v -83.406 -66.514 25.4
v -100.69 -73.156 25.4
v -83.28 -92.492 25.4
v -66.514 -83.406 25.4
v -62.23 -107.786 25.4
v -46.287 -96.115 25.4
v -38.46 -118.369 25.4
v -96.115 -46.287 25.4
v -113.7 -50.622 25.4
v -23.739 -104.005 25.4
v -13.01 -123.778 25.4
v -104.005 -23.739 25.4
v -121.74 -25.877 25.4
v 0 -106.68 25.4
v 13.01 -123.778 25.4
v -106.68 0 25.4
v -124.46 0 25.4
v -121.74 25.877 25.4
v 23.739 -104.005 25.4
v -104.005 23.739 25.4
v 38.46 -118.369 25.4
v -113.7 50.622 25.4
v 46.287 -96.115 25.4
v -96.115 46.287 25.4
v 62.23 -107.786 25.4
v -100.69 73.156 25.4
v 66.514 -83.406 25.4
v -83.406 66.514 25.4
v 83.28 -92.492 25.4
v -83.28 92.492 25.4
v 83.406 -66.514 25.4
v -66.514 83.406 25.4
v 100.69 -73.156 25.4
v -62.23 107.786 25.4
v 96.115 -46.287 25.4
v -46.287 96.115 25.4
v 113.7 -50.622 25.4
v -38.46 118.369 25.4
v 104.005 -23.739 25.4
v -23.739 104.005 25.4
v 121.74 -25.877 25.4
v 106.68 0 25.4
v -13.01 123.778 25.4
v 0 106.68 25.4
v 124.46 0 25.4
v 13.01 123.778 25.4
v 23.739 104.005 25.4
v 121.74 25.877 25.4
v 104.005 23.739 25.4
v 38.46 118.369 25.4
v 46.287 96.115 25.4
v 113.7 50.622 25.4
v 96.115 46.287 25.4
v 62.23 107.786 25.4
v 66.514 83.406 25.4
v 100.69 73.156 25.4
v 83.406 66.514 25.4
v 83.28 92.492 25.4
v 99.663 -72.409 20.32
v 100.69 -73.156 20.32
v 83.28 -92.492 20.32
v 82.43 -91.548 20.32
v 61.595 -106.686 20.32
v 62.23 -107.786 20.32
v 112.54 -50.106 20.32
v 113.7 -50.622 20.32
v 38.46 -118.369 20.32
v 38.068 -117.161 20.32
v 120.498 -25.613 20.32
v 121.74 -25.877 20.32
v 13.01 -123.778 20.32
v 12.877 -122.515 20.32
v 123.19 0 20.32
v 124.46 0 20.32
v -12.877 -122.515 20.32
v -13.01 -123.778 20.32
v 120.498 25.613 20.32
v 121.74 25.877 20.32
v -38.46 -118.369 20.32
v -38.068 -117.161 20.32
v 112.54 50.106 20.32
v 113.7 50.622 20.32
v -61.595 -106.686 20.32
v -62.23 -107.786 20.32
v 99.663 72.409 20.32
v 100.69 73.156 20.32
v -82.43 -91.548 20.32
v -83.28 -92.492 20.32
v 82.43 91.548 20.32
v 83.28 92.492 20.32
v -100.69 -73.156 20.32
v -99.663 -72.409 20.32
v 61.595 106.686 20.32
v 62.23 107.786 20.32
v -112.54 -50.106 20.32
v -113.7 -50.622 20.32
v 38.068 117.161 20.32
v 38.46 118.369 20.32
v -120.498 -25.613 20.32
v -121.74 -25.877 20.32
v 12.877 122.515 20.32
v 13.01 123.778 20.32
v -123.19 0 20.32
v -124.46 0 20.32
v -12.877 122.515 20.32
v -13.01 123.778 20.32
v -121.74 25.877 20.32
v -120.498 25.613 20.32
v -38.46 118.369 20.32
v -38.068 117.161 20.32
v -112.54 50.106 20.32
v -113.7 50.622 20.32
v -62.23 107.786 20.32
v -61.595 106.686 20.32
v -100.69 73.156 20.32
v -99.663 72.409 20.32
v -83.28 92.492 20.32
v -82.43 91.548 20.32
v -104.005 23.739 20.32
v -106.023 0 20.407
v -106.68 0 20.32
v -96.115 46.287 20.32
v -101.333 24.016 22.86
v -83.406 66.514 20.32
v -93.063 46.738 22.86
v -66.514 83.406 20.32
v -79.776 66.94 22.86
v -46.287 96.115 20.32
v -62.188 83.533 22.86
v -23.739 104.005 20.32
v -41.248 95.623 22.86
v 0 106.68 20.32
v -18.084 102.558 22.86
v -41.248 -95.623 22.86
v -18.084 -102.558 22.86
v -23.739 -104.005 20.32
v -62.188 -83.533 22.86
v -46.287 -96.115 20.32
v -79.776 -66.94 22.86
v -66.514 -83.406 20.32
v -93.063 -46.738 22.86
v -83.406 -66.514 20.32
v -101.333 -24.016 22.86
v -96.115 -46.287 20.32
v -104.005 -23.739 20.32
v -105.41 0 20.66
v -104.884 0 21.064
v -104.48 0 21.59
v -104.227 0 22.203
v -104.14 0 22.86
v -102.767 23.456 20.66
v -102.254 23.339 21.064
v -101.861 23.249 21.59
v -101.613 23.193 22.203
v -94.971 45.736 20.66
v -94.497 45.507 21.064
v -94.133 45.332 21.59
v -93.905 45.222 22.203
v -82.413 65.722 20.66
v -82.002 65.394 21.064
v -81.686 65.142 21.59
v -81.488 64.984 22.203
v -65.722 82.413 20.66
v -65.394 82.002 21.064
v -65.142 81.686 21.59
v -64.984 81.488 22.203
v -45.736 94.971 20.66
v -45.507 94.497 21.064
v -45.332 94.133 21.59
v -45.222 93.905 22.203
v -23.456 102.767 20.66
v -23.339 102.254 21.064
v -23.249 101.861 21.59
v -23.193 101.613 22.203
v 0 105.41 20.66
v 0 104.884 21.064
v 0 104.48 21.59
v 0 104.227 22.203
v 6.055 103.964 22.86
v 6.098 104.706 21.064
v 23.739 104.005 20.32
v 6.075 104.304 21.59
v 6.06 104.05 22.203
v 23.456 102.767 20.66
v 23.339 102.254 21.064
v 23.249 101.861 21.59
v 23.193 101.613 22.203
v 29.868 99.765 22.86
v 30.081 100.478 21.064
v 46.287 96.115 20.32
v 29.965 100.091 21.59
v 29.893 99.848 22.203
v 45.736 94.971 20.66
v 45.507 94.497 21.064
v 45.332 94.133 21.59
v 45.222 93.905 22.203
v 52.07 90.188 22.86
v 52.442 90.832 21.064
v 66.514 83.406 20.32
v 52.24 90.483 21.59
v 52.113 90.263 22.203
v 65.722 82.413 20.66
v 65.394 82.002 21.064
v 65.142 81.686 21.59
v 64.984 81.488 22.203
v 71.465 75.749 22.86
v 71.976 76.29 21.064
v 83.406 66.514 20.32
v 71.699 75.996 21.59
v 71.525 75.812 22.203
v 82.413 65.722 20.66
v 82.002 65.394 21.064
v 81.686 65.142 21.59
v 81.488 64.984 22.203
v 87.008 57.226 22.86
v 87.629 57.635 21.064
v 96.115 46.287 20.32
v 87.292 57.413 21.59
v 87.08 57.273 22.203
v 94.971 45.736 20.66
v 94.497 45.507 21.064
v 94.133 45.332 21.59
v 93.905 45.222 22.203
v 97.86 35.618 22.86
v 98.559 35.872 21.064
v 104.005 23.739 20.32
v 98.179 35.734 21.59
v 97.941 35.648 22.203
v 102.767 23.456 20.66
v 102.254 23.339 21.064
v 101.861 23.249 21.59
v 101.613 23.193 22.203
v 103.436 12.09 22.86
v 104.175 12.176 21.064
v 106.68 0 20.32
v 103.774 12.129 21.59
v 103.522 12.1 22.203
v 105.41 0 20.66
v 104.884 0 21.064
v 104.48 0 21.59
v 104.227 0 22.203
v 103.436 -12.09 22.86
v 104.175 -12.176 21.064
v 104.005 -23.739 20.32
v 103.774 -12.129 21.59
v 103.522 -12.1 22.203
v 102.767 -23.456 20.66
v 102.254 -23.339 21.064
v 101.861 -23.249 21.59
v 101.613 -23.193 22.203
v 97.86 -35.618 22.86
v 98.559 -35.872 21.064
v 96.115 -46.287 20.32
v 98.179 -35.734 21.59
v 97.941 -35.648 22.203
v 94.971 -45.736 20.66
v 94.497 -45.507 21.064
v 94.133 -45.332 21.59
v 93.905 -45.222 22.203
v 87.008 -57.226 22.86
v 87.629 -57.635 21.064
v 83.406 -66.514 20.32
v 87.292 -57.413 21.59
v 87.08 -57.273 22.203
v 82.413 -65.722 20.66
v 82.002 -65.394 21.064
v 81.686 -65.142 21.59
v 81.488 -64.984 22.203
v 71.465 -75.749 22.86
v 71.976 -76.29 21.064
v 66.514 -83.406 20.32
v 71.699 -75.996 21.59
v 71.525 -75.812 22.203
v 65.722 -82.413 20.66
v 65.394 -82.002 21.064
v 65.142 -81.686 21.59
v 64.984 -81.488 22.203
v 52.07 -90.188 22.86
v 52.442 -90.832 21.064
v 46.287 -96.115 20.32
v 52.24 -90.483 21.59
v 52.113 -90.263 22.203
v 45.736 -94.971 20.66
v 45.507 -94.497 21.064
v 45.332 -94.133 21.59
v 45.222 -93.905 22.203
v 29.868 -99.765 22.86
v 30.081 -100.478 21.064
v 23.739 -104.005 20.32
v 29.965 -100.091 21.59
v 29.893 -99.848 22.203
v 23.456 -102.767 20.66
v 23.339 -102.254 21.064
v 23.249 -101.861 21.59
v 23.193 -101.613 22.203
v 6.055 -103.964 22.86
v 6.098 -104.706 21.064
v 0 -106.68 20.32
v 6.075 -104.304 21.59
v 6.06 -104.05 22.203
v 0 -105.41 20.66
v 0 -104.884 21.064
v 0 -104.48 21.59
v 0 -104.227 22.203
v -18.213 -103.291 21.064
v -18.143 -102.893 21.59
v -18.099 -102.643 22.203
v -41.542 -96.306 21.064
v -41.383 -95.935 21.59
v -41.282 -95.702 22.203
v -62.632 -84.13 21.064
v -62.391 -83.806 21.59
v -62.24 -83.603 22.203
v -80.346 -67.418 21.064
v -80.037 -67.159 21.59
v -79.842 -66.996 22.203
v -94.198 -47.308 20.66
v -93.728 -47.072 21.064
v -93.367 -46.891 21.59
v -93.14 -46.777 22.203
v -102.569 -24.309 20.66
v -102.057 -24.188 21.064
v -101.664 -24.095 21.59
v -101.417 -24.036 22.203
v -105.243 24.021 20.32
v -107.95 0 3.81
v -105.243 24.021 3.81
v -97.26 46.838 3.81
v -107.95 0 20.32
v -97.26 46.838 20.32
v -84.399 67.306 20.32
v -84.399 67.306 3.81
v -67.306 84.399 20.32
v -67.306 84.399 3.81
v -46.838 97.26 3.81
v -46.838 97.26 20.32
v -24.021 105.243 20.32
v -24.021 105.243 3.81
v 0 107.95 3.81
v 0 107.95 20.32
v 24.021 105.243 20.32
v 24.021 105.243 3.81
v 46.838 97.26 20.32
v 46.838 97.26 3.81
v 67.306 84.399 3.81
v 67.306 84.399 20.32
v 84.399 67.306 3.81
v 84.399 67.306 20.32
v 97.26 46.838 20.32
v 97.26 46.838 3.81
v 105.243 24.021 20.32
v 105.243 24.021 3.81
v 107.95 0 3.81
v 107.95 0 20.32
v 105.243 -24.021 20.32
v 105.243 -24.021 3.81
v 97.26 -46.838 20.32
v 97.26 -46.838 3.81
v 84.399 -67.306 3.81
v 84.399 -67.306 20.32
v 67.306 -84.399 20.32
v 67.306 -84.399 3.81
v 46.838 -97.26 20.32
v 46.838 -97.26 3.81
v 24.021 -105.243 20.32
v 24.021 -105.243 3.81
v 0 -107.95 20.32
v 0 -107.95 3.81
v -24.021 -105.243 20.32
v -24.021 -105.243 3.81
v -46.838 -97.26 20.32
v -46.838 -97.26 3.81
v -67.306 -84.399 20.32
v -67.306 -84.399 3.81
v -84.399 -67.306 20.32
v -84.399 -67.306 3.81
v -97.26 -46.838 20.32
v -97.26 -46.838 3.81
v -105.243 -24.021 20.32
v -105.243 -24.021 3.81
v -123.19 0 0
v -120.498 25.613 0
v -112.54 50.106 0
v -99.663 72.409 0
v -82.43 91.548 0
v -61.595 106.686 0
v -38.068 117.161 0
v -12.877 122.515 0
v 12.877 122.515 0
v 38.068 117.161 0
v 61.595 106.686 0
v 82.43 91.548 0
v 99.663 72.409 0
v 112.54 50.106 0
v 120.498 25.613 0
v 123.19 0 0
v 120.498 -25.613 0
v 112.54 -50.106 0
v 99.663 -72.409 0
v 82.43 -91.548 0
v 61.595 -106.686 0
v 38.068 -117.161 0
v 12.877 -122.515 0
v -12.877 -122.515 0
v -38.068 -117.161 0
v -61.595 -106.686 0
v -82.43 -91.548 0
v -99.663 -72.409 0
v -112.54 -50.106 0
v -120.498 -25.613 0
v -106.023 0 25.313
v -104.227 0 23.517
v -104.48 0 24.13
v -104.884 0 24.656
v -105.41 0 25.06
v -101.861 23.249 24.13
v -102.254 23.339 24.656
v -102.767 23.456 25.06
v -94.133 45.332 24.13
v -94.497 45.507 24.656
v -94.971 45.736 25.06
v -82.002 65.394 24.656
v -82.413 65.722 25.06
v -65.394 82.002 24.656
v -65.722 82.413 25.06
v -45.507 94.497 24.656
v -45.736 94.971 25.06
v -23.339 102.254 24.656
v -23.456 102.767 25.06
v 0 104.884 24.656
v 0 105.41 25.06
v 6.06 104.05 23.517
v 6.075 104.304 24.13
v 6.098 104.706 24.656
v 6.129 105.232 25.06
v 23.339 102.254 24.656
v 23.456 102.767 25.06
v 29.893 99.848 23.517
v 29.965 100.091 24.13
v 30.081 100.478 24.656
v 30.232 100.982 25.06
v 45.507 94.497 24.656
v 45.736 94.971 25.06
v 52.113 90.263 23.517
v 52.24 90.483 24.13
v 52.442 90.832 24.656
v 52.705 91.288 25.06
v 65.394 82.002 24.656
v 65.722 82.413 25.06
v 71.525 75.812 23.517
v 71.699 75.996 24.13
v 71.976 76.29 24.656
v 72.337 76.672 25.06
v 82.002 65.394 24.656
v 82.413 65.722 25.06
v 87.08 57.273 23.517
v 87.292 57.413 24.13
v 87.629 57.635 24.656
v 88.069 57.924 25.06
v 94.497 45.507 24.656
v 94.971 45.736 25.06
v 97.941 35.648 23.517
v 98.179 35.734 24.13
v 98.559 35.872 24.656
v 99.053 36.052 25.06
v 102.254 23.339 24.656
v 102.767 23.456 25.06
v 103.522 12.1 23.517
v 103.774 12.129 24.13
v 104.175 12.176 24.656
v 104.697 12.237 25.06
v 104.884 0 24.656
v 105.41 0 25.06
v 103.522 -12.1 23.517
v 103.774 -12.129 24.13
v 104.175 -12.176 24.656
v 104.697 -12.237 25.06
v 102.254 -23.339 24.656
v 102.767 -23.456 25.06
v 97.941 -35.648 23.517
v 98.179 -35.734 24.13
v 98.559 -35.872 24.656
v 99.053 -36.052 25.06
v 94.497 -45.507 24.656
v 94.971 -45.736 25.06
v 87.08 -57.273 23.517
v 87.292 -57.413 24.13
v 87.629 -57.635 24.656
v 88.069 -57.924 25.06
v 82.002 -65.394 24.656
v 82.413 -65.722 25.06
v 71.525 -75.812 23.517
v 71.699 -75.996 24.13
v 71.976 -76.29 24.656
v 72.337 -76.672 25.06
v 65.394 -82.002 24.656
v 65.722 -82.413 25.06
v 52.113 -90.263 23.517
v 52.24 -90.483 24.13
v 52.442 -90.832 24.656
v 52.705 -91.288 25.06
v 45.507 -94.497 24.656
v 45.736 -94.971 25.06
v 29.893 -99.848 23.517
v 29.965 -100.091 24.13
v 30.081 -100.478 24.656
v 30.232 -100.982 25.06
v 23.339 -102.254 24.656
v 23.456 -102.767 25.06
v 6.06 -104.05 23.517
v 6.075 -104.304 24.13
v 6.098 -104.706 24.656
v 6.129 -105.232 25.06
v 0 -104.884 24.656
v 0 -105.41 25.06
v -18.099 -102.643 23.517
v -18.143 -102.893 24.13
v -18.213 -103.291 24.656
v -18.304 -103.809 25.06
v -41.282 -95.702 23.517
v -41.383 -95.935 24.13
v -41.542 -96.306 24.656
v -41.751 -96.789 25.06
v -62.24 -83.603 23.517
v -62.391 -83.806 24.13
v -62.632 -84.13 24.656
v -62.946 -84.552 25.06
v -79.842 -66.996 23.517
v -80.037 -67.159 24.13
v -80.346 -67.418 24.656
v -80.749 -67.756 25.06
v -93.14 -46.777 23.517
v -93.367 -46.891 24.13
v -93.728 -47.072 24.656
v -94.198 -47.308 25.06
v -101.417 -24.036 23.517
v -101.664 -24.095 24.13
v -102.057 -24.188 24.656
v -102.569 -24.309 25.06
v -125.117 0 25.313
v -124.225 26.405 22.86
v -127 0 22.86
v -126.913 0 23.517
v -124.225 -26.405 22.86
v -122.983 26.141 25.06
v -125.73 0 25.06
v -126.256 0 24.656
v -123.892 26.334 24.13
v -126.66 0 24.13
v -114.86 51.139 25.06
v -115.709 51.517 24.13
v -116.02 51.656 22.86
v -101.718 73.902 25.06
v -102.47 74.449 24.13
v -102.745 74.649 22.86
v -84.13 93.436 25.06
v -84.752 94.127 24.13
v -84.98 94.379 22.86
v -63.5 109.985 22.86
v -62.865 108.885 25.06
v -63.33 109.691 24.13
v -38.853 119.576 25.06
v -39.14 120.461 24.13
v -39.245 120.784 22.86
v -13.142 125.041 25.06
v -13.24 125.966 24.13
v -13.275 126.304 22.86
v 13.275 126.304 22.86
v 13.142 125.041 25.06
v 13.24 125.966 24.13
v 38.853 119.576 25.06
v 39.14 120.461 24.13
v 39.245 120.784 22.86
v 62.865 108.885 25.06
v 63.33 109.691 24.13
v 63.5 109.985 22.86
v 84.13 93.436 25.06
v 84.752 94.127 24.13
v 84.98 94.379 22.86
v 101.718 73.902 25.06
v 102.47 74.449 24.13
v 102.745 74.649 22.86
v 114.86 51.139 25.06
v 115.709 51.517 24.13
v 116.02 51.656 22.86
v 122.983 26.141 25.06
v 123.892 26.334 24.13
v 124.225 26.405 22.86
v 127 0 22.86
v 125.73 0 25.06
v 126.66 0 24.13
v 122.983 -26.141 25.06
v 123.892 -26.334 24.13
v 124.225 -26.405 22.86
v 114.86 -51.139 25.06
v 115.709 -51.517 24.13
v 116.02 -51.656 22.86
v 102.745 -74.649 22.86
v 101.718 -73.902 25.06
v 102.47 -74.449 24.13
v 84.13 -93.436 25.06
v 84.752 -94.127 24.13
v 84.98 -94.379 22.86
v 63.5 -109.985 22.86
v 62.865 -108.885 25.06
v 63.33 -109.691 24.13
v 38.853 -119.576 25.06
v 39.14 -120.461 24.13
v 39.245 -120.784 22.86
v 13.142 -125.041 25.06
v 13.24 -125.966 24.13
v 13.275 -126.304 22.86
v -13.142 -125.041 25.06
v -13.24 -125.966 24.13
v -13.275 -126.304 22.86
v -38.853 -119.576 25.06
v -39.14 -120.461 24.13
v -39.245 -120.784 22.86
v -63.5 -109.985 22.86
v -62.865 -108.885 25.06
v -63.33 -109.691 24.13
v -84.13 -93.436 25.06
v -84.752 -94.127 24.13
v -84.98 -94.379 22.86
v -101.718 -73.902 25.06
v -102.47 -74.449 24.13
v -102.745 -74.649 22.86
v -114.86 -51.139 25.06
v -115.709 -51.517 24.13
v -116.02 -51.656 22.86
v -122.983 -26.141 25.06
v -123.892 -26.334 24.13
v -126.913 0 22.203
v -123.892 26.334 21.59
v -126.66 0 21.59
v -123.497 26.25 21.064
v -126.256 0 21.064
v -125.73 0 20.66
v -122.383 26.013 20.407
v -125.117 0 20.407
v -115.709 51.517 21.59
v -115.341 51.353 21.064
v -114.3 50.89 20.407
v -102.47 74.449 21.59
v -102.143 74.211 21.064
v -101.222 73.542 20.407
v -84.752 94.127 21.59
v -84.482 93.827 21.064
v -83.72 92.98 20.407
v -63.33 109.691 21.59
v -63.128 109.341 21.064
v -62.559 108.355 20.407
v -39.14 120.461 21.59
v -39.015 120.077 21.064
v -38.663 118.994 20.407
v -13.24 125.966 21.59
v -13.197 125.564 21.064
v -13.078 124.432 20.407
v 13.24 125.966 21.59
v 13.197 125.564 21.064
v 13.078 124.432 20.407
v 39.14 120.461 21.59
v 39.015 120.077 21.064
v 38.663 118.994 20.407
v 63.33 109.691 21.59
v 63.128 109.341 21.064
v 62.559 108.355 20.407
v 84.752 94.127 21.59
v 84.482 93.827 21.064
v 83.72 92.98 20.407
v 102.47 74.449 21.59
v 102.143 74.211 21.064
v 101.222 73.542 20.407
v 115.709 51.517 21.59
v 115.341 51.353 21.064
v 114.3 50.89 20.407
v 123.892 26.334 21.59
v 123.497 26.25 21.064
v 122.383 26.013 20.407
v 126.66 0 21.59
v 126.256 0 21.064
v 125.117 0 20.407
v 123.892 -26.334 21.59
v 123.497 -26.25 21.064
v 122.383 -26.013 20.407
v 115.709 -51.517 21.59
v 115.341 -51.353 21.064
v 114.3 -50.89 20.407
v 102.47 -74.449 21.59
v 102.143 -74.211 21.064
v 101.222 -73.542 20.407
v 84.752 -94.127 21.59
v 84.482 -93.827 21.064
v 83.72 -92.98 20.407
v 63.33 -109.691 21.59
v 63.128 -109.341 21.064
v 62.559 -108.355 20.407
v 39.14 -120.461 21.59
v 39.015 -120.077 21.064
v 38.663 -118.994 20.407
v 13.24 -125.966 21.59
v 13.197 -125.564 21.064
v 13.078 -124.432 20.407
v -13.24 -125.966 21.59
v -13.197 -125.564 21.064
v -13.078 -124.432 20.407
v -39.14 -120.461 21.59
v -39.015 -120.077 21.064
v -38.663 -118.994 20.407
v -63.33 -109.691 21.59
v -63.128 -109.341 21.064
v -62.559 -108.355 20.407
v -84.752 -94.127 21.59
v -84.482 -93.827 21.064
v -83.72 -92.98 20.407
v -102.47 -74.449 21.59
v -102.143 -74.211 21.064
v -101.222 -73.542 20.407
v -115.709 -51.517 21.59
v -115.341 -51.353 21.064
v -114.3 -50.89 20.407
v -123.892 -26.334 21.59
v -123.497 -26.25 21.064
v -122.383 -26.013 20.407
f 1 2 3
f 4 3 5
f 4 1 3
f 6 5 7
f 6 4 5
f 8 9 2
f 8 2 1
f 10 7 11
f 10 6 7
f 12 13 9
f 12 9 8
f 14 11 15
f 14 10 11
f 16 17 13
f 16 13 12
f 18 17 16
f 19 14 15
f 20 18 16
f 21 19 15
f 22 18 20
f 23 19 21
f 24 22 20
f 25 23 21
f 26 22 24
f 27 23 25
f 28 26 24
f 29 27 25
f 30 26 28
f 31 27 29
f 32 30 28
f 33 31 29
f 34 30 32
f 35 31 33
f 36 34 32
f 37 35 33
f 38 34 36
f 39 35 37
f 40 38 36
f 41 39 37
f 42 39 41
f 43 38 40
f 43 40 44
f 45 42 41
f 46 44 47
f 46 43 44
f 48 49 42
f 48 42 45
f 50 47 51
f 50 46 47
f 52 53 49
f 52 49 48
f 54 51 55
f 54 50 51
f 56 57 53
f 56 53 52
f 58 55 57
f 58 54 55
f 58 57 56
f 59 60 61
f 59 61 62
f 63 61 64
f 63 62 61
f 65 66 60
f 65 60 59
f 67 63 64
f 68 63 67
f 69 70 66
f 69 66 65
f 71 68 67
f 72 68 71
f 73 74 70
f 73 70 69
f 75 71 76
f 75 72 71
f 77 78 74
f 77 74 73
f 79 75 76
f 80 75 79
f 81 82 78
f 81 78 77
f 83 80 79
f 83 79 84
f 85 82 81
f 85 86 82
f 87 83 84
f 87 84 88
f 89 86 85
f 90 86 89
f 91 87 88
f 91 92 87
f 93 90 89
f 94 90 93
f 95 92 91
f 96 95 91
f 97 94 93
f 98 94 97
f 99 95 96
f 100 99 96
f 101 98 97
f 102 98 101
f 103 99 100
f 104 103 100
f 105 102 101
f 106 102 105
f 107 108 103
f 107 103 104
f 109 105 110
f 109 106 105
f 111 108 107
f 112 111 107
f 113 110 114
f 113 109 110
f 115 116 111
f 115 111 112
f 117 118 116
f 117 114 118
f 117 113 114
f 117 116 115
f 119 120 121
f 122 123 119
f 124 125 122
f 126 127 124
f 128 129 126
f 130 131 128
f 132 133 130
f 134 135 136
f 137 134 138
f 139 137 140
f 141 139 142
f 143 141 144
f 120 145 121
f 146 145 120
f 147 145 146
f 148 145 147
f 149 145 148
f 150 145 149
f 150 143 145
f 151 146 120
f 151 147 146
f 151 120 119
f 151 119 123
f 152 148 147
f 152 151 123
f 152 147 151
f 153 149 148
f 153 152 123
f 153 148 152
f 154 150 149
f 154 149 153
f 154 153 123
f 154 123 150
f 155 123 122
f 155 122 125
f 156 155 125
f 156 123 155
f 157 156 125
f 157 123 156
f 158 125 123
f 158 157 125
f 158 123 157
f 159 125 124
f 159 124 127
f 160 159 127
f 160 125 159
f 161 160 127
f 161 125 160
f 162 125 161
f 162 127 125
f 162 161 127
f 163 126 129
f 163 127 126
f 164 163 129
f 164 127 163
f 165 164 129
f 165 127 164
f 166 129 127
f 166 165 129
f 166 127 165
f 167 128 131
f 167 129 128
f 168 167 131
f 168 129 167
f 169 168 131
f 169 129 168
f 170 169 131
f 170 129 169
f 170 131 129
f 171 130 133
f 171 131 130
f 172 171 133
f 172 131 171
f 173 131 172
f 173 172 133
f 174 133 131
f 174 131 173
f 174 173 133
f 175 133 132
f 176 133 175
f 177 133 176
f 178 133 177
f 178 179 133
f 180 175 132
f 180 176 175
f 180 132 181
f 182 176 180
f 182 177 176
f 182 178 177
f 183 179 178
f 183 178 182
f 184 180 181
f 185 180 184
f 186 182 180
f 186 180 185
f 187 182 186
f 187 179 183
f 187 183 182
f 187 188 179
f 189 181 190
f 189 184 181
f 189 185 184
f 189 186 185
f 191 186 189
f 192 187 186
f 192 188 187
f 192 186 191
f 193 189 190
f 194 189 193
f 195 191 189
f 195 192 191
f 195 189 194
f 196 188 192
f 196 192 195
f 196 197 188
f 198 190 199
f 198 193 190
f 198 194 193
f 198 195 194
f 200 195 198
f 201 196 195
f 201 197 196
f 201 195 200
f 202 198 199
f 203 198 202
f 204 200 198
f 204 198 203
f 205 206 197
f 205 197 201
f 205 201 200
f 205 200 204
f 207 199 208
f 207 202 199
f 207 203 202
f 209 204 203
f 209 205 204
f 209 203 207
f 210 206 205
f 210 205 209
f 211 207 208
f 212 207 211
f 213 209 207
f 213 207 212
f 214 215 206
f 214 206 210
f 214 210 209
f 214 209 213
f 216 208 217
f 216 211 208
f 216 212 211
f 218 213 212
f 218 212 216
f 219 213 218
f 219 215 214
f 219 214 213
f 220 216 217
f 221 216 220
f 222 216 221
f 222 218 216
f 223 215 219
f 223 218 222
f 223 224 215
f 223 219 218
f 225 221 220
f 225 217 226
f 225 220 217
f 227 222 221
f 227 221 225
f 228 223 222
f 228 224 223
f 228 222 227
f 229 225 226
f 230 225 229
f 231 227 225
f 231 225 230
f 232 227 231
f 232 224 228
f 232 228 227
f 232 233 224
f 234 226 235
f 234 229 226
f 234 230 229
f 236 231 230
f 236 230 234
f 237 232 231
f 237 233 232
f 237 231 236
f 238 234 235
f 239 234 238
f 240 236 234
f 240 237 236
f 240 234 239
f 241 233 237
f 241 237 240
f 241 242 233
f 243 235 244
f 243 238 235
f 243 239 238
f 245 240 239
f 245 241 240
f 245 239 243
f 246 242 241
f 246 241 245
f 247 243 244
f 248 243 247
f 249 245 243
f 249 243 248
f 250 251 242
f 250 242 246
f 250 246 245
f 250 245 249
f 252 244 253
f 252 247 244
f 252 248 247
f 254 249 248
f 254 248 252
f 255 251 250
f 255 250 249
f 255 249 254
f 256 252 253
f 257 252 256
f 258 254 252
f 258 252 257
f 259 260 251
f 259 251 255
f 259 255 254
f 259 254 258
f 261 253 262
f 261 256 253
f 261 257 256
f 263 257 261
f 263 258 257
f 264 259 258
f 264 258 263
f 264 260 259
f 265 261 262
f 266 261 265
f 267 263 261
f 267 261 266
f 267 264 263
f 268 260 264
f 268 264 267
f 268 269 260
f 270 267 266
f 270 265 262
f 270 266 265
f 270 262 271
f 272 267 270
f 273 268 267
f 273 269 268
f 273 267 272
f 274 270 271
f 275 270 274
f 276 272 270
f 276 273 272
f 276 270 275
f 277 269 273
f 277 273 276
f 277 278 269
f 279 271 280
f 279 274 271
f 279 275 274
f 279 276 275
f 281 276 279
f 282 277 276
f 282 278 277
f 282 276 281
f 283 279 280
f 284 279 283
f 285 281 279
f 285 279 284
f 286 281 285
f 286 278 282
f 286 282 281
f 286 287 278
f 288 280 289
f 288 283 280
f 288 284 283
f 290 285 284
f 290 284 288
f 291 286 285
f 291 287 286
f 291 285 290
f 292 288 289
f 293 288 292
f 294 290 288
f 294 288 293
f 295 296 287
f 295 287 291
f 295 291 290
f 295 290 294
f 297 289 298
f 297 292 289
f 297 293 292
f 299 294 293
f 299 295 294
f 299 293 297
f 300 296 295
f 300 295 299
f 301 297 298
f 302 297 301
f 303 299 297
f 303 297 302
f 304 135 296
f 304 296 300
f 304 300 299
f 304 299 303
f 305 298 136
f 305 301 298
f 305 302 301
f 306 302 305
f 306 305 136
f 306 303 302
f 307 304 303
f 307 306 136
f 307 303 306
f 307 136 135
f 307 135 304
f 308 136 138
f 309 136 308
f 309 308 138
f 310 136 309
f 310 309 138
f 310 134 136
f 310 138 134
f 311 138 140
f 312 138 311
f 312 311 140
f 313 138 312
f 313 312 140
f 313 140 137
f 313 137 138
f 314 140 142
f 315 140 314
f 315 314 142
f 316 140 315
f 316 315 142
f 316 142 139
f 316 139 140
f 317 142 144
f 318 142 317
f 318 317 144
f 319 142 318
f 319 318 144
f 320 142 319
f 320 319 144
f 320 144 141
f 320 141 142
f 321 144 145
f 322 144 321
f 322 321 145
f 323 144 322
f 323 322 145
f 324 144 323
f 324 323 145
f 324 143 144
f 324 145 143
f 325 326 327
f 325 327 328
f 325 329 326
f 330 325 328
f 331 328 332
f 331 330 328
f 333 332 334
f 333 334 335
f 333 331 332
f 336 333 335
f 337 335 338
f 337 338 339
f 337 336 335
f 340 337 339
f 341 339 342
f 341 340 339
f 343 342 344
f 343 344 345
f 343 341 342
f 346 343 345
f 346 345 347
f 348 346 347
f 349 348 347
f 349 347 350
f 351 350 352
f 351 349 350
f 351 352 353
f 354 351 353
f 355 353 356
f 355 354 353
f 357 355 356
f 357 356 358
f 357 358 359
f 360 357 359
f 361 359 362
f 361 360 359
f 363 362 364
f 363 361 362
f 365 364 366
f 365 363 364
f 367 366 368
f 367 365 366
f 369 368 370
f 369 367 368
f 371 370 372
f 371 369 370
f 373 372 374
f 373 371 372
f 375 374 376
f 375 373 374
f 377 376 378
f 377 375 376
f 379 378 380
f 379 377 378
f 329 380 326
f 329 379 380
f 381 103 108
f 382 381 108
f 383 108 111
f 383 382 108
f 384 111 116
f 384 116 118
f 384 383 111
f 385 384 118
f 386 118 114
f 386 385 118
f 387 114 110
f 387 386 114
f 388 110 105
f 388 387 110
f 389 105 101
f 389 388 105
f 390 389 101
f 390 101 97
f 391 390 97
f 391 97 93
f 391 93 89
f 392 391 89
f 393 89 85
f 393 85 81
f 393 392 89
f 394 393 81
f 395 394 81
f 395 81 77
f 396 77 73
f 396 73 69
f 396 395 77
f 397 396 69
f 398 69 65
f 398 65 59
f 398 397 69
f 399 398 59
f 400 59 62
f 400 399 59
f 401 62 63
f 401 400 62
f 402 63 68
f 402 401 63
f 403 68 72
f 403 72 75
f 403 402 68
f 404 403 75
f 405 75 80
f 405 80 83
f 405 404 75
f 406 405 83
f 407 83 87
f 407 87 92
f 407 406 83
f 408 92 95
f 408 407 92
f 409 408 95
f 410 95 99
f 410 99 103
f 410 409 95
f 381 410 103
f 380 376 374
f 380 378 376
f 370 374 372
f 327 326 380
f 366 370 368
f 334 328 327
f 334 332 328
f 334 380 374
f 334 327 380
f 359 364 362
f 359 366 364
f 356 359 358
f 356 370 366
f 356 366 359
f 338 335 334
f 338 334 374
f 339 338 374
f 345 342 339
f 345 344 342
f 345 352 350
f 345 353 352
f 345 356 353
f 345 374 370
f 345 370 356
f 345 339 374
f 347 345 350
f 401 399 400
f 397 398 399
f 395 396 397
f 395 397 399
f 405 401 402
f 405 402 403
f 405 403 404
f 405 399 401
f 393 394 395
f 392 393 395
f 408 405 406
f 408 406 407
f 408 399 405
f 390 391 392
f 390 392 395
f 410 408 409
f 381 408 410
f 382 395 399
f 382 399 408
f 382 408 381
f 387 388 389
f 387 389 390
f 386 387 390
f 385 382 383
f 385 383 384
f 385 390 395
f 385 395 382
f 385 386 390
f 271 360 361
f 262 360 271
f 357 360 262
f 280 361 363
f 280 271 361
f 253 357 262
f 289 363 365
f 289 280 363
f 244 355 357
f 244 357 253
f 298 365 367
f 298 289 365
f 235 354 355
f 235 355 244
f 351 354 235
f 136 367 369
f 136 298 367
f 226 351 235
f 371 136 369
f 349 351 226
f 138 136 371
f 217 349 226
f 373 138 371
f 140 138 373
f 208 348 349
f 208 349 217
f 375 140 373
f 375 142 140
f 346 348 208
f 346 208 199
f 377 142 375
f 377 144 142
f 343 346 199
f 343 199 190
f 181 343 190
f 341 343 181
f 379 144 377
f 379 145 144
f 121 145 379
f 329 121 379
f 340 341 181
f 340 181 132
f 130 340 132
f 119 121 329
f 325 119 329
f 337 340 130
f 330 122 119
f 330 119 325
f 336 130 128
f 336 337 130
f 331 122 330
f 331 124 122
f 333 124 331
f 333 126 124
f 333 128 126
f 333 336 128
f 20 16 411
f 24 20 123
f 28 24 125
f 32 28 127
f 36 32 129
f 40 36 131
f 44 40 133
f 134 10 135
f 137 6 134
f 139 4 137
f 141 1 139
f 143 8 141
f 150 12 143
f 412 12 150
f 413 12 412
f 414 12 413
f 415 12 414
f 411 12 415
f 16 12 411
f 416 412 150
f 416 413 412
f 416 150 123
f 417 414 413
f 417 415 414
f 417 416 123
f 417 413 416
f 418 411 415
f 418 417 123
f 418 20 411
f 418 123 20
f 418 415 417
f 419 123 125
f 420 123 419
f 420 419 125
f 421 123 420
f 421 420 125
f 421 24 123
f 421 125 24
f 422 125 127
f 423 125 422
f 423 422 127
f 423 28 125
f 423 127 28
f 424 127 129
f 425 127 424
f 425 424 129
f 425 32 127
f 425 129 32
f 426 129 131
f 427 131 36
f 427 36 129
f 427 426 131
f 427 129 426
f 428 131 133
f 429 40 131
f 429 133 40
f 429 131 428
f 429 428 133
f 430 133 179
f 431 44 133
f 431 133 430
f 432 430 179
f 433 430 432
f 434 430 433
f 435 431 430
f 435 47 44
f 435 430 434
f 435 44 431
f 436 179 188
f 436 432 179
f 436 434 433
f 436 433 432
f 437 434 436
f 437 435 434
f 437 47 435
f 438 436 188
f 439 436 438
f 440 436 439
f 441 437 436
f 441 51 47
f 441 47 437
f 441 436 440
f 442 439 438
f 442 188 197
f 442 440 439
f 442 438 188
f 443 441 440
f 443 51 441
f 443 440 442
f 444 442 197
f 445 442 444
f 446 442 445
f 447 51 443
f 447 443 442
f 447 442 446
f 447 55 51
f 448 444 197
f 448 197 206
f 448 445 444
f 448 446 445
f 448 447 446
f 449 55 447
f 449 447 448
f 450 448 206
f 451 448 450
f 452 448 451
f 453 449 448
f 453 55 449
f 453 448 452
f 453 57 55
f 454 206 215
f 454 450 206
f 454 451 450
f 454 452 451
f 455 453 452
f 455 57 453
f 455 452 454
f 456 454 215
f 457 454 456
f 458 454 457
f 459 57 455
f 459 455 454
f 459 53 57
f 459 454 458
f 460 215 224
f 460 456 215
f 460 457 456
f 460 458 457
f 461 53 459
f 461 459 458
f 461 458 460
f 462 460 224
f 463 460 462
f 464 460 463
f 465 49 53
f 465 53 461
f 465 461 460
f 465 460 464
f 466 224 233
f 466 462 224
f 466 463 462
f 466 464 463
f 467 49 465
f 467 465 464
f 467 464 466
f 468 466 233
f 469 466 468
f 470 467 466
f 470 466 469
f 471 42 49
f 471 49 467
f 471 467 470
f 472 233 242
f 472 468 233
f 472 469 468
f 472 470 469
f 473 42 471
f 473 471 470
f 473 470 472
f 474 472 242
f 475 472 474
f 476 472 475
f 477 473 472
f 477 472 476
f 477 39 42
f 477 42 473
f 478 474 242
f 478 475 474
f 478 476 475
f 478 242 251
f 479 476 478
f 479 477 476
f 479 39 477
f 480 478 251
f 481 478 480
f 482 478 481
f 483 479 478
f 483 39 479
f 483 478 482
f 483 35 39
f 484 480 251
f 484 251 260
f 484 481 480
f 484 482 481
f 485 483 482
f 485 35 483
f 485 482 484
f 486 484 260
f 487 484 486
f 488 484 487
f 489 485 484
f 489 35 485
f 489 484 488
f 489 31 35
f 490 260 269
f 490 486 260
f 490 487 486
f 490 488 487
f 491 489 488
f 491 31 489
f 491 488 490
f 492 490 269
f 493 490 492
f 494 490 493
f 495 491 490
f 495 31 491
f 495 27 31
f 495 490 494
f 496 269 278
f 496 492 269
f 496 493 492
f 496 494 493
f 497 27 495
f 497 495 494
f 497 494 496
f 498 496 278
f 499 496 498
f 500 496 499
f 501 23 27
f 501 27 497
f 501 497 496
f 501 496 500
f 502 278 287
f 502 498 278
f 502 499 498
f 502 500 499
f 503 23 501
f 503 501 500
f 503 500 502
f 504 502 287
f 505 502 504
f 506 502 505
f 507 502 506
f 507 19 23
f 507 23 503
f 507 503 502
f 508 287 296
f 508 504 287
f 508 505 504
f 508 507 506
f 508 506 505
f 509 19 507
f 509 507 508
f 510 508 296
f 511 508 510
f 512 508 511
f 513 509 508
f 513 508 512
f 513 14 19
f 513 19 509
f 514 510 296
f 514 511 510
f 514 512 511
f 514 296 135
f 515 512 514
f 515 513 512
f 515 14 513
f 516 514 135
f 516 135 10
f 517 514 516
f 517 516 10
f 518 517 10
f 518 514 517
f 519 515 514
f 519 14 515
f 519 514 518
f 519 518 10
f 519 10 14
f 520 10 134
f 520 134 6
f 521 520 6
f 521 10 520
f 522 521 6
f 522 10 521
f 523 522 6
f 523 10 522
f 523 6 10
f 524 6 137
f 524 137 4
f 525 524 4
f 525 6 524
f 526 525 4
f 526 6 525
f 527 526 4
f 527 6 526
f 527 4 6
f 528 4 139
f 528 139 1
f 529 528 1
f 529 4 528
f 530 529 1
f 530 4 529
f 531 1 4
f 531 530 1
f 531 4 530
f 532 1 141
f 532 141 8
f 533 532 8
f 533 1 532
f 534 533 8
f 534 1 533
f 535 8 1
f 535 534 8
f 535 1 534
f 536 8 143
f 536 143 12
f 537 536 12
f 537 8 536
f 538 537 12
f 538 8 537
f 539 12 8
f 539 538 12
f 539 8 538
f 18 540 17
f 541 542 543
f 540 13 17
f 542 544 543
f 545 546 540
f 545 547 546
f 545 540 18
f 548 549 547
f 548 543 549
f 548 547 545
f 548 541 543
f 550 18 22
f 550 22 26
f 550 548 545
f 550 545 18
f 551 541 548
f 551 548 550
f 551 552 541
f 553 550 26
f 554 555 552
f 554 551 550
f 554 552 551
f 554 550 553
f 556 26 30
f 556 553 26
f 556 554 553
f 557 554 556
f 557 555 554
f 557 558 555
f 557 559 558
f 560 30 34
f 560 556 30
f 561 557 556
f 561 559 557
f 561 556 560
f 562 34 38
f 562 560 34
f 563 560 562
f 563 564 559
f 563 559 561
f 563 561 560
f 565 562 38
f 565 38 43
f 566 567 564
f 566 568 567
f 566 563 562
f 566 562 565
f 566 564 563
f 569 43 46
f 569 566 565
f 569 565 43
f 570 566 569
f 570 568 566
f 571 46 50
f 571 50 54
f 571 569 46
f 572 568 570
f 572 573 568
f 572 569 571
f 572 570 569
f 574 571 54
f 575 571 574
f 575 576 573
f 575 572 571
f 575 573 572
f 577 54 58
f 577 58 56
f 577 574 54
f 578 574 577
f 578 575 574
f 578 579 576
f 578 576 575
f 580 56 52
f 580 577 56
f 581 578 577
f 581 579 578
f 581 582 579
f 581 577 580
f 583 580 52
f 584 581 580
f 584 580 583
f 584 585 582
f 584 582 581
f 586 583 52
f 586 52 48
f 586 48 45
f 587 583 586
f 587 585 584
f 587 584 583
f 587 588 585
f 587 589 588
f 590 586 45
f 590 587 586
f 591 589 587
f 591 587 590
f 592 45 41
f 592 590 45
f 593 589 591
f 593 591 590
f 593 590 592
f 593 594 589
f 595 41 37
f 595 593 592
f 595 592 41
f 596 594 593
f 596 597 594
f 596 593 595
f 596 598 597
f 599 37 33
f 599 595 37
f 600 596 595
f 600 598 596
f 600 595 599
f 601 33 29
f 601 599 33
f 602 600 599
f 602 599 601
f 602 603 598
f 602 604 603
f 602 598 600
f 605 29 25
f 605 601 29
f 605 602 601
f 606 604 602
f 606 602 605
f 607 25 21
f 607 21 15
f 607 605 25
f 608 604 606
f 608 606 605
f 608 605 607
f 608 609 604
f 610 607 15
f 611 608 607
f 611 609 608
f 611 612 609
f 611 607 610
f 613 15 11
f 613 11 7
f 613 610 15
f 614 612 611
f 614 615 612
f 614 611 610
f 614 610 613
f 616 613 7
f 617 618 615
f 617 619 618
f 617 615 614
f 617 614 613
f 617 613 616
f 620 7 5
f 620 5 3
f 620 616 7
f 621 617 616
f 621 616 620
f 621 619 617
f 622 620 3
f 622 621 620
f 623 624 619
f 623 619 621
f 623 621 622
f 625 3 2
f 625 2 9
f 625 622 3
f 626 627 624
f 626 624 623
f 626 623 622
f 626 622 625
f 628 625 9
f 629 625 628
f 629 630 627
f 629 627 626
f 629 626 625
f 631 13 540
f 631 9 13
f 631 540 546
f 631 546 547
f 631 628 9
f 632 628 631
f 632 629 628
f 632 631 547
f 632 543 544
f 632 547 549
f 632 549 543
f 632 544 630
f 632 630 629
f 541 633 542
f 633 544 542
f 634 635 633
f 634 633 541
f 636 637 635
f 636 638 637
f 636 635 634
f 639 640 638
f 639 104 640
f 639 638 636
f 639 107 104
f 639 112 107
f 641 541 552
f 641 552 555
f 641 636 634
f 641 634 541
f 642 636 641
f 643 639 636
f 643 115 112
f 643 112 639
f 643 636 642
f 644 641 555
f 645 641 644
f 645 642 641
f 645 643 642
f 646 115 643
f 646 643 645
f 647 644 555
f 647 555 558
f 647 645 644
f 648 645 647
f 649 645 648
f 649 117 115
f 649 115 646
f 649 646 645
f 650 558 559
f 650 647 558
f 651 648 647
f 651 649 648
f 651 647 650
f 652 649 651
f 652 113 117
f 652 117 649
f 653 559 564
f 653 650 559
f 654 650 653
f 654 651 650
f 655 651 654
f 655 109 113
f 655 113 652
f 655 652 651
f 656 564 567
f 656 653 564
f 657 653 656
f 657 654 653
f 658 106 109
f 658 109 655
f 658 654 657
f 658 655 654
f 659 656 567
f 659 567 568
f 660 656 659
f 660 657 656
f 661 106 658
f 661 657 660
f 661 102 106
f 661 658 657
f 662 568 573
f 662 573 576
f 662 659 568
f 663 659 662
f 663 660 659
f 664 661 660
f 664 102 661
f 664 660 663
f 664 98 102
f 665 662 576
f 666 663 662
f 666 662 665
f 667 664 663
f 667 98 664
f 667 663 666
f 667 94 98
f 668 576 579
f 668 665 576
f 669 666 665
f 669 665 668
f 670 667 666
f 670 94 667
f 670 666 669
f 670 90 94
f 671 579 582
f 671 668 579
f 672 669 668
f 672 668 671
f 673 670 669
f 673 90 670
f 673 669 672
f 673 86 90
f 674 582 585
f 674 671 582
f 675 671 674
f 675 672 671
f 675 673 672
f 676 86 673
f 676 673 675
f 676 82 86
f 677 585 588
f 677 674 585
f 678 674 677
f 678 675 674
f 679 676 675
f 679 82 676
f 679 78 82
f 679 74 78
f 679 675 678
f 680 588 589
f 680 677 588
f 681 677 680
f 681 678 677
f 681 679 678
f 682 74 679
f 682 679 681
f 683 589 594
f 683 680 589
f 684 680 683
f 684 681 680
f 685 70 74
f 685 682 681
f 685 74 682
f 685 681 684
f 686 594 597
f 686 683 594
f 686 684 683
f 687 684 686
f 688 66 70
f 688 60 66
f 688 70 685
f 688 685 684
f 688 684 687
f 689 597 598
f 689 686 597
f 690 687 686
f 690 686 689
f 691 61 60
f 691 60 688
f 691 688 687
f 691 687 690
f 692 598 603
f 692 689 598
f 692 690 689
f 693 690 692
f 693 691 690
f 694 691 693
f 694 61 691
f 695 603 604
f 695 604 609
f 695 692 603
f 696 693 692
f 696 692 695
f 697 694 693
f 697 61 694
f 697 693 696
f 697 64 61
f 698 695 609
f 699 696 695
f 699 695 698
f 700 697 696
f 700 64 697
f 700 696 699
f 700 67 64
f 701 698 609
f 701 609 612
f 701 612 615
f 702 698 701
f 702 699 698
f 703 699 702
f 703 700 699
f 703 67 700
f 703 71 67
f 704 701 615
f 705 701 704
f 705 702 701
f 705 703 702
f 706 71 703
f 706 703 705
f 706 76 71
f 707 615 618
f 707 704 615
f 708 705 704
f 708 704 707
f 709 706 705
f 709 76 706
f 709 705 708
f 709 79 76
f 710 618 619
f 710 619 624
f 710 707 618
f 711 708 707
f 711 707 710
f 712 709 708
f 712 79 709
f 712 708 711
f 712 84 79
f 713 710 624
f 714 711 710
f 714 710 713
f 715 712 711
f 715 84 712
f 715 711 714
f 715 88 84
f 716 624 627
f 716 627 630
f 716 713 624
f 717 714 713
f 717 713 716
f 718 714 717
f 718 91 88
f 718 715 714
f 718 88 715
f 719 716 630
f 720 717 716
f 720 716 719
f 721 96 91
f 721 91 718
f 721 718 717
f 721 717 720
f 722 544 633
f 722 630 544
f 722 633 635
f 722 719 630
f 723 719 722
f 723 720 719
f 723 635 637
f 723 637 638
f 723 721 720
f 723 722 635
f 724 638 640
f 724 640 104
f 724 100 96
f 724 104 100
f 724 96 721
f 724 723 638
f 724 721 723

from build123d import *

# Parameters (mm, degrees)
F2_R = 2.53999


# Not quite as in the source:
# - a fillet or chamfer is up to 0.001 mm smaller than in the source, because OpenCascade refuses the exact size


with BuildPart() as f1:
    # F0 (on Front) → F1 (revolve)
    with BuildSketch(Plane.XZ):
        Polygon((-123.19, 0), (0, 0), (0, 3.81), (-107.95, 3.81), (-107.95, 20.32), (-104.14, 20.32), (-104.14, 25.4), (-127, 25.4), (-127, 20.32), (-123.19, 20.32), align=None)
    revolve(axis=Axis((0, 0, 1.905), (0, 0, -1)))

    # F2 (radius 2.54 in the source; OpenCascade refuses exactly that, so slightly less here)
    f2_edges = [f1.edges().sort_by_distance(p)[0] for p in [
        (127, 0, 25.4),
        (127, 0, 20.32),
        (-127, 0, 22.86),
        (104.14, 0, 20.32),
        (104.14, 0, 25.4),
        (-104.14, 0, 22.86),
    ]]
    fillet(f2_edges, radius=F2_R)


solid = f1.part
